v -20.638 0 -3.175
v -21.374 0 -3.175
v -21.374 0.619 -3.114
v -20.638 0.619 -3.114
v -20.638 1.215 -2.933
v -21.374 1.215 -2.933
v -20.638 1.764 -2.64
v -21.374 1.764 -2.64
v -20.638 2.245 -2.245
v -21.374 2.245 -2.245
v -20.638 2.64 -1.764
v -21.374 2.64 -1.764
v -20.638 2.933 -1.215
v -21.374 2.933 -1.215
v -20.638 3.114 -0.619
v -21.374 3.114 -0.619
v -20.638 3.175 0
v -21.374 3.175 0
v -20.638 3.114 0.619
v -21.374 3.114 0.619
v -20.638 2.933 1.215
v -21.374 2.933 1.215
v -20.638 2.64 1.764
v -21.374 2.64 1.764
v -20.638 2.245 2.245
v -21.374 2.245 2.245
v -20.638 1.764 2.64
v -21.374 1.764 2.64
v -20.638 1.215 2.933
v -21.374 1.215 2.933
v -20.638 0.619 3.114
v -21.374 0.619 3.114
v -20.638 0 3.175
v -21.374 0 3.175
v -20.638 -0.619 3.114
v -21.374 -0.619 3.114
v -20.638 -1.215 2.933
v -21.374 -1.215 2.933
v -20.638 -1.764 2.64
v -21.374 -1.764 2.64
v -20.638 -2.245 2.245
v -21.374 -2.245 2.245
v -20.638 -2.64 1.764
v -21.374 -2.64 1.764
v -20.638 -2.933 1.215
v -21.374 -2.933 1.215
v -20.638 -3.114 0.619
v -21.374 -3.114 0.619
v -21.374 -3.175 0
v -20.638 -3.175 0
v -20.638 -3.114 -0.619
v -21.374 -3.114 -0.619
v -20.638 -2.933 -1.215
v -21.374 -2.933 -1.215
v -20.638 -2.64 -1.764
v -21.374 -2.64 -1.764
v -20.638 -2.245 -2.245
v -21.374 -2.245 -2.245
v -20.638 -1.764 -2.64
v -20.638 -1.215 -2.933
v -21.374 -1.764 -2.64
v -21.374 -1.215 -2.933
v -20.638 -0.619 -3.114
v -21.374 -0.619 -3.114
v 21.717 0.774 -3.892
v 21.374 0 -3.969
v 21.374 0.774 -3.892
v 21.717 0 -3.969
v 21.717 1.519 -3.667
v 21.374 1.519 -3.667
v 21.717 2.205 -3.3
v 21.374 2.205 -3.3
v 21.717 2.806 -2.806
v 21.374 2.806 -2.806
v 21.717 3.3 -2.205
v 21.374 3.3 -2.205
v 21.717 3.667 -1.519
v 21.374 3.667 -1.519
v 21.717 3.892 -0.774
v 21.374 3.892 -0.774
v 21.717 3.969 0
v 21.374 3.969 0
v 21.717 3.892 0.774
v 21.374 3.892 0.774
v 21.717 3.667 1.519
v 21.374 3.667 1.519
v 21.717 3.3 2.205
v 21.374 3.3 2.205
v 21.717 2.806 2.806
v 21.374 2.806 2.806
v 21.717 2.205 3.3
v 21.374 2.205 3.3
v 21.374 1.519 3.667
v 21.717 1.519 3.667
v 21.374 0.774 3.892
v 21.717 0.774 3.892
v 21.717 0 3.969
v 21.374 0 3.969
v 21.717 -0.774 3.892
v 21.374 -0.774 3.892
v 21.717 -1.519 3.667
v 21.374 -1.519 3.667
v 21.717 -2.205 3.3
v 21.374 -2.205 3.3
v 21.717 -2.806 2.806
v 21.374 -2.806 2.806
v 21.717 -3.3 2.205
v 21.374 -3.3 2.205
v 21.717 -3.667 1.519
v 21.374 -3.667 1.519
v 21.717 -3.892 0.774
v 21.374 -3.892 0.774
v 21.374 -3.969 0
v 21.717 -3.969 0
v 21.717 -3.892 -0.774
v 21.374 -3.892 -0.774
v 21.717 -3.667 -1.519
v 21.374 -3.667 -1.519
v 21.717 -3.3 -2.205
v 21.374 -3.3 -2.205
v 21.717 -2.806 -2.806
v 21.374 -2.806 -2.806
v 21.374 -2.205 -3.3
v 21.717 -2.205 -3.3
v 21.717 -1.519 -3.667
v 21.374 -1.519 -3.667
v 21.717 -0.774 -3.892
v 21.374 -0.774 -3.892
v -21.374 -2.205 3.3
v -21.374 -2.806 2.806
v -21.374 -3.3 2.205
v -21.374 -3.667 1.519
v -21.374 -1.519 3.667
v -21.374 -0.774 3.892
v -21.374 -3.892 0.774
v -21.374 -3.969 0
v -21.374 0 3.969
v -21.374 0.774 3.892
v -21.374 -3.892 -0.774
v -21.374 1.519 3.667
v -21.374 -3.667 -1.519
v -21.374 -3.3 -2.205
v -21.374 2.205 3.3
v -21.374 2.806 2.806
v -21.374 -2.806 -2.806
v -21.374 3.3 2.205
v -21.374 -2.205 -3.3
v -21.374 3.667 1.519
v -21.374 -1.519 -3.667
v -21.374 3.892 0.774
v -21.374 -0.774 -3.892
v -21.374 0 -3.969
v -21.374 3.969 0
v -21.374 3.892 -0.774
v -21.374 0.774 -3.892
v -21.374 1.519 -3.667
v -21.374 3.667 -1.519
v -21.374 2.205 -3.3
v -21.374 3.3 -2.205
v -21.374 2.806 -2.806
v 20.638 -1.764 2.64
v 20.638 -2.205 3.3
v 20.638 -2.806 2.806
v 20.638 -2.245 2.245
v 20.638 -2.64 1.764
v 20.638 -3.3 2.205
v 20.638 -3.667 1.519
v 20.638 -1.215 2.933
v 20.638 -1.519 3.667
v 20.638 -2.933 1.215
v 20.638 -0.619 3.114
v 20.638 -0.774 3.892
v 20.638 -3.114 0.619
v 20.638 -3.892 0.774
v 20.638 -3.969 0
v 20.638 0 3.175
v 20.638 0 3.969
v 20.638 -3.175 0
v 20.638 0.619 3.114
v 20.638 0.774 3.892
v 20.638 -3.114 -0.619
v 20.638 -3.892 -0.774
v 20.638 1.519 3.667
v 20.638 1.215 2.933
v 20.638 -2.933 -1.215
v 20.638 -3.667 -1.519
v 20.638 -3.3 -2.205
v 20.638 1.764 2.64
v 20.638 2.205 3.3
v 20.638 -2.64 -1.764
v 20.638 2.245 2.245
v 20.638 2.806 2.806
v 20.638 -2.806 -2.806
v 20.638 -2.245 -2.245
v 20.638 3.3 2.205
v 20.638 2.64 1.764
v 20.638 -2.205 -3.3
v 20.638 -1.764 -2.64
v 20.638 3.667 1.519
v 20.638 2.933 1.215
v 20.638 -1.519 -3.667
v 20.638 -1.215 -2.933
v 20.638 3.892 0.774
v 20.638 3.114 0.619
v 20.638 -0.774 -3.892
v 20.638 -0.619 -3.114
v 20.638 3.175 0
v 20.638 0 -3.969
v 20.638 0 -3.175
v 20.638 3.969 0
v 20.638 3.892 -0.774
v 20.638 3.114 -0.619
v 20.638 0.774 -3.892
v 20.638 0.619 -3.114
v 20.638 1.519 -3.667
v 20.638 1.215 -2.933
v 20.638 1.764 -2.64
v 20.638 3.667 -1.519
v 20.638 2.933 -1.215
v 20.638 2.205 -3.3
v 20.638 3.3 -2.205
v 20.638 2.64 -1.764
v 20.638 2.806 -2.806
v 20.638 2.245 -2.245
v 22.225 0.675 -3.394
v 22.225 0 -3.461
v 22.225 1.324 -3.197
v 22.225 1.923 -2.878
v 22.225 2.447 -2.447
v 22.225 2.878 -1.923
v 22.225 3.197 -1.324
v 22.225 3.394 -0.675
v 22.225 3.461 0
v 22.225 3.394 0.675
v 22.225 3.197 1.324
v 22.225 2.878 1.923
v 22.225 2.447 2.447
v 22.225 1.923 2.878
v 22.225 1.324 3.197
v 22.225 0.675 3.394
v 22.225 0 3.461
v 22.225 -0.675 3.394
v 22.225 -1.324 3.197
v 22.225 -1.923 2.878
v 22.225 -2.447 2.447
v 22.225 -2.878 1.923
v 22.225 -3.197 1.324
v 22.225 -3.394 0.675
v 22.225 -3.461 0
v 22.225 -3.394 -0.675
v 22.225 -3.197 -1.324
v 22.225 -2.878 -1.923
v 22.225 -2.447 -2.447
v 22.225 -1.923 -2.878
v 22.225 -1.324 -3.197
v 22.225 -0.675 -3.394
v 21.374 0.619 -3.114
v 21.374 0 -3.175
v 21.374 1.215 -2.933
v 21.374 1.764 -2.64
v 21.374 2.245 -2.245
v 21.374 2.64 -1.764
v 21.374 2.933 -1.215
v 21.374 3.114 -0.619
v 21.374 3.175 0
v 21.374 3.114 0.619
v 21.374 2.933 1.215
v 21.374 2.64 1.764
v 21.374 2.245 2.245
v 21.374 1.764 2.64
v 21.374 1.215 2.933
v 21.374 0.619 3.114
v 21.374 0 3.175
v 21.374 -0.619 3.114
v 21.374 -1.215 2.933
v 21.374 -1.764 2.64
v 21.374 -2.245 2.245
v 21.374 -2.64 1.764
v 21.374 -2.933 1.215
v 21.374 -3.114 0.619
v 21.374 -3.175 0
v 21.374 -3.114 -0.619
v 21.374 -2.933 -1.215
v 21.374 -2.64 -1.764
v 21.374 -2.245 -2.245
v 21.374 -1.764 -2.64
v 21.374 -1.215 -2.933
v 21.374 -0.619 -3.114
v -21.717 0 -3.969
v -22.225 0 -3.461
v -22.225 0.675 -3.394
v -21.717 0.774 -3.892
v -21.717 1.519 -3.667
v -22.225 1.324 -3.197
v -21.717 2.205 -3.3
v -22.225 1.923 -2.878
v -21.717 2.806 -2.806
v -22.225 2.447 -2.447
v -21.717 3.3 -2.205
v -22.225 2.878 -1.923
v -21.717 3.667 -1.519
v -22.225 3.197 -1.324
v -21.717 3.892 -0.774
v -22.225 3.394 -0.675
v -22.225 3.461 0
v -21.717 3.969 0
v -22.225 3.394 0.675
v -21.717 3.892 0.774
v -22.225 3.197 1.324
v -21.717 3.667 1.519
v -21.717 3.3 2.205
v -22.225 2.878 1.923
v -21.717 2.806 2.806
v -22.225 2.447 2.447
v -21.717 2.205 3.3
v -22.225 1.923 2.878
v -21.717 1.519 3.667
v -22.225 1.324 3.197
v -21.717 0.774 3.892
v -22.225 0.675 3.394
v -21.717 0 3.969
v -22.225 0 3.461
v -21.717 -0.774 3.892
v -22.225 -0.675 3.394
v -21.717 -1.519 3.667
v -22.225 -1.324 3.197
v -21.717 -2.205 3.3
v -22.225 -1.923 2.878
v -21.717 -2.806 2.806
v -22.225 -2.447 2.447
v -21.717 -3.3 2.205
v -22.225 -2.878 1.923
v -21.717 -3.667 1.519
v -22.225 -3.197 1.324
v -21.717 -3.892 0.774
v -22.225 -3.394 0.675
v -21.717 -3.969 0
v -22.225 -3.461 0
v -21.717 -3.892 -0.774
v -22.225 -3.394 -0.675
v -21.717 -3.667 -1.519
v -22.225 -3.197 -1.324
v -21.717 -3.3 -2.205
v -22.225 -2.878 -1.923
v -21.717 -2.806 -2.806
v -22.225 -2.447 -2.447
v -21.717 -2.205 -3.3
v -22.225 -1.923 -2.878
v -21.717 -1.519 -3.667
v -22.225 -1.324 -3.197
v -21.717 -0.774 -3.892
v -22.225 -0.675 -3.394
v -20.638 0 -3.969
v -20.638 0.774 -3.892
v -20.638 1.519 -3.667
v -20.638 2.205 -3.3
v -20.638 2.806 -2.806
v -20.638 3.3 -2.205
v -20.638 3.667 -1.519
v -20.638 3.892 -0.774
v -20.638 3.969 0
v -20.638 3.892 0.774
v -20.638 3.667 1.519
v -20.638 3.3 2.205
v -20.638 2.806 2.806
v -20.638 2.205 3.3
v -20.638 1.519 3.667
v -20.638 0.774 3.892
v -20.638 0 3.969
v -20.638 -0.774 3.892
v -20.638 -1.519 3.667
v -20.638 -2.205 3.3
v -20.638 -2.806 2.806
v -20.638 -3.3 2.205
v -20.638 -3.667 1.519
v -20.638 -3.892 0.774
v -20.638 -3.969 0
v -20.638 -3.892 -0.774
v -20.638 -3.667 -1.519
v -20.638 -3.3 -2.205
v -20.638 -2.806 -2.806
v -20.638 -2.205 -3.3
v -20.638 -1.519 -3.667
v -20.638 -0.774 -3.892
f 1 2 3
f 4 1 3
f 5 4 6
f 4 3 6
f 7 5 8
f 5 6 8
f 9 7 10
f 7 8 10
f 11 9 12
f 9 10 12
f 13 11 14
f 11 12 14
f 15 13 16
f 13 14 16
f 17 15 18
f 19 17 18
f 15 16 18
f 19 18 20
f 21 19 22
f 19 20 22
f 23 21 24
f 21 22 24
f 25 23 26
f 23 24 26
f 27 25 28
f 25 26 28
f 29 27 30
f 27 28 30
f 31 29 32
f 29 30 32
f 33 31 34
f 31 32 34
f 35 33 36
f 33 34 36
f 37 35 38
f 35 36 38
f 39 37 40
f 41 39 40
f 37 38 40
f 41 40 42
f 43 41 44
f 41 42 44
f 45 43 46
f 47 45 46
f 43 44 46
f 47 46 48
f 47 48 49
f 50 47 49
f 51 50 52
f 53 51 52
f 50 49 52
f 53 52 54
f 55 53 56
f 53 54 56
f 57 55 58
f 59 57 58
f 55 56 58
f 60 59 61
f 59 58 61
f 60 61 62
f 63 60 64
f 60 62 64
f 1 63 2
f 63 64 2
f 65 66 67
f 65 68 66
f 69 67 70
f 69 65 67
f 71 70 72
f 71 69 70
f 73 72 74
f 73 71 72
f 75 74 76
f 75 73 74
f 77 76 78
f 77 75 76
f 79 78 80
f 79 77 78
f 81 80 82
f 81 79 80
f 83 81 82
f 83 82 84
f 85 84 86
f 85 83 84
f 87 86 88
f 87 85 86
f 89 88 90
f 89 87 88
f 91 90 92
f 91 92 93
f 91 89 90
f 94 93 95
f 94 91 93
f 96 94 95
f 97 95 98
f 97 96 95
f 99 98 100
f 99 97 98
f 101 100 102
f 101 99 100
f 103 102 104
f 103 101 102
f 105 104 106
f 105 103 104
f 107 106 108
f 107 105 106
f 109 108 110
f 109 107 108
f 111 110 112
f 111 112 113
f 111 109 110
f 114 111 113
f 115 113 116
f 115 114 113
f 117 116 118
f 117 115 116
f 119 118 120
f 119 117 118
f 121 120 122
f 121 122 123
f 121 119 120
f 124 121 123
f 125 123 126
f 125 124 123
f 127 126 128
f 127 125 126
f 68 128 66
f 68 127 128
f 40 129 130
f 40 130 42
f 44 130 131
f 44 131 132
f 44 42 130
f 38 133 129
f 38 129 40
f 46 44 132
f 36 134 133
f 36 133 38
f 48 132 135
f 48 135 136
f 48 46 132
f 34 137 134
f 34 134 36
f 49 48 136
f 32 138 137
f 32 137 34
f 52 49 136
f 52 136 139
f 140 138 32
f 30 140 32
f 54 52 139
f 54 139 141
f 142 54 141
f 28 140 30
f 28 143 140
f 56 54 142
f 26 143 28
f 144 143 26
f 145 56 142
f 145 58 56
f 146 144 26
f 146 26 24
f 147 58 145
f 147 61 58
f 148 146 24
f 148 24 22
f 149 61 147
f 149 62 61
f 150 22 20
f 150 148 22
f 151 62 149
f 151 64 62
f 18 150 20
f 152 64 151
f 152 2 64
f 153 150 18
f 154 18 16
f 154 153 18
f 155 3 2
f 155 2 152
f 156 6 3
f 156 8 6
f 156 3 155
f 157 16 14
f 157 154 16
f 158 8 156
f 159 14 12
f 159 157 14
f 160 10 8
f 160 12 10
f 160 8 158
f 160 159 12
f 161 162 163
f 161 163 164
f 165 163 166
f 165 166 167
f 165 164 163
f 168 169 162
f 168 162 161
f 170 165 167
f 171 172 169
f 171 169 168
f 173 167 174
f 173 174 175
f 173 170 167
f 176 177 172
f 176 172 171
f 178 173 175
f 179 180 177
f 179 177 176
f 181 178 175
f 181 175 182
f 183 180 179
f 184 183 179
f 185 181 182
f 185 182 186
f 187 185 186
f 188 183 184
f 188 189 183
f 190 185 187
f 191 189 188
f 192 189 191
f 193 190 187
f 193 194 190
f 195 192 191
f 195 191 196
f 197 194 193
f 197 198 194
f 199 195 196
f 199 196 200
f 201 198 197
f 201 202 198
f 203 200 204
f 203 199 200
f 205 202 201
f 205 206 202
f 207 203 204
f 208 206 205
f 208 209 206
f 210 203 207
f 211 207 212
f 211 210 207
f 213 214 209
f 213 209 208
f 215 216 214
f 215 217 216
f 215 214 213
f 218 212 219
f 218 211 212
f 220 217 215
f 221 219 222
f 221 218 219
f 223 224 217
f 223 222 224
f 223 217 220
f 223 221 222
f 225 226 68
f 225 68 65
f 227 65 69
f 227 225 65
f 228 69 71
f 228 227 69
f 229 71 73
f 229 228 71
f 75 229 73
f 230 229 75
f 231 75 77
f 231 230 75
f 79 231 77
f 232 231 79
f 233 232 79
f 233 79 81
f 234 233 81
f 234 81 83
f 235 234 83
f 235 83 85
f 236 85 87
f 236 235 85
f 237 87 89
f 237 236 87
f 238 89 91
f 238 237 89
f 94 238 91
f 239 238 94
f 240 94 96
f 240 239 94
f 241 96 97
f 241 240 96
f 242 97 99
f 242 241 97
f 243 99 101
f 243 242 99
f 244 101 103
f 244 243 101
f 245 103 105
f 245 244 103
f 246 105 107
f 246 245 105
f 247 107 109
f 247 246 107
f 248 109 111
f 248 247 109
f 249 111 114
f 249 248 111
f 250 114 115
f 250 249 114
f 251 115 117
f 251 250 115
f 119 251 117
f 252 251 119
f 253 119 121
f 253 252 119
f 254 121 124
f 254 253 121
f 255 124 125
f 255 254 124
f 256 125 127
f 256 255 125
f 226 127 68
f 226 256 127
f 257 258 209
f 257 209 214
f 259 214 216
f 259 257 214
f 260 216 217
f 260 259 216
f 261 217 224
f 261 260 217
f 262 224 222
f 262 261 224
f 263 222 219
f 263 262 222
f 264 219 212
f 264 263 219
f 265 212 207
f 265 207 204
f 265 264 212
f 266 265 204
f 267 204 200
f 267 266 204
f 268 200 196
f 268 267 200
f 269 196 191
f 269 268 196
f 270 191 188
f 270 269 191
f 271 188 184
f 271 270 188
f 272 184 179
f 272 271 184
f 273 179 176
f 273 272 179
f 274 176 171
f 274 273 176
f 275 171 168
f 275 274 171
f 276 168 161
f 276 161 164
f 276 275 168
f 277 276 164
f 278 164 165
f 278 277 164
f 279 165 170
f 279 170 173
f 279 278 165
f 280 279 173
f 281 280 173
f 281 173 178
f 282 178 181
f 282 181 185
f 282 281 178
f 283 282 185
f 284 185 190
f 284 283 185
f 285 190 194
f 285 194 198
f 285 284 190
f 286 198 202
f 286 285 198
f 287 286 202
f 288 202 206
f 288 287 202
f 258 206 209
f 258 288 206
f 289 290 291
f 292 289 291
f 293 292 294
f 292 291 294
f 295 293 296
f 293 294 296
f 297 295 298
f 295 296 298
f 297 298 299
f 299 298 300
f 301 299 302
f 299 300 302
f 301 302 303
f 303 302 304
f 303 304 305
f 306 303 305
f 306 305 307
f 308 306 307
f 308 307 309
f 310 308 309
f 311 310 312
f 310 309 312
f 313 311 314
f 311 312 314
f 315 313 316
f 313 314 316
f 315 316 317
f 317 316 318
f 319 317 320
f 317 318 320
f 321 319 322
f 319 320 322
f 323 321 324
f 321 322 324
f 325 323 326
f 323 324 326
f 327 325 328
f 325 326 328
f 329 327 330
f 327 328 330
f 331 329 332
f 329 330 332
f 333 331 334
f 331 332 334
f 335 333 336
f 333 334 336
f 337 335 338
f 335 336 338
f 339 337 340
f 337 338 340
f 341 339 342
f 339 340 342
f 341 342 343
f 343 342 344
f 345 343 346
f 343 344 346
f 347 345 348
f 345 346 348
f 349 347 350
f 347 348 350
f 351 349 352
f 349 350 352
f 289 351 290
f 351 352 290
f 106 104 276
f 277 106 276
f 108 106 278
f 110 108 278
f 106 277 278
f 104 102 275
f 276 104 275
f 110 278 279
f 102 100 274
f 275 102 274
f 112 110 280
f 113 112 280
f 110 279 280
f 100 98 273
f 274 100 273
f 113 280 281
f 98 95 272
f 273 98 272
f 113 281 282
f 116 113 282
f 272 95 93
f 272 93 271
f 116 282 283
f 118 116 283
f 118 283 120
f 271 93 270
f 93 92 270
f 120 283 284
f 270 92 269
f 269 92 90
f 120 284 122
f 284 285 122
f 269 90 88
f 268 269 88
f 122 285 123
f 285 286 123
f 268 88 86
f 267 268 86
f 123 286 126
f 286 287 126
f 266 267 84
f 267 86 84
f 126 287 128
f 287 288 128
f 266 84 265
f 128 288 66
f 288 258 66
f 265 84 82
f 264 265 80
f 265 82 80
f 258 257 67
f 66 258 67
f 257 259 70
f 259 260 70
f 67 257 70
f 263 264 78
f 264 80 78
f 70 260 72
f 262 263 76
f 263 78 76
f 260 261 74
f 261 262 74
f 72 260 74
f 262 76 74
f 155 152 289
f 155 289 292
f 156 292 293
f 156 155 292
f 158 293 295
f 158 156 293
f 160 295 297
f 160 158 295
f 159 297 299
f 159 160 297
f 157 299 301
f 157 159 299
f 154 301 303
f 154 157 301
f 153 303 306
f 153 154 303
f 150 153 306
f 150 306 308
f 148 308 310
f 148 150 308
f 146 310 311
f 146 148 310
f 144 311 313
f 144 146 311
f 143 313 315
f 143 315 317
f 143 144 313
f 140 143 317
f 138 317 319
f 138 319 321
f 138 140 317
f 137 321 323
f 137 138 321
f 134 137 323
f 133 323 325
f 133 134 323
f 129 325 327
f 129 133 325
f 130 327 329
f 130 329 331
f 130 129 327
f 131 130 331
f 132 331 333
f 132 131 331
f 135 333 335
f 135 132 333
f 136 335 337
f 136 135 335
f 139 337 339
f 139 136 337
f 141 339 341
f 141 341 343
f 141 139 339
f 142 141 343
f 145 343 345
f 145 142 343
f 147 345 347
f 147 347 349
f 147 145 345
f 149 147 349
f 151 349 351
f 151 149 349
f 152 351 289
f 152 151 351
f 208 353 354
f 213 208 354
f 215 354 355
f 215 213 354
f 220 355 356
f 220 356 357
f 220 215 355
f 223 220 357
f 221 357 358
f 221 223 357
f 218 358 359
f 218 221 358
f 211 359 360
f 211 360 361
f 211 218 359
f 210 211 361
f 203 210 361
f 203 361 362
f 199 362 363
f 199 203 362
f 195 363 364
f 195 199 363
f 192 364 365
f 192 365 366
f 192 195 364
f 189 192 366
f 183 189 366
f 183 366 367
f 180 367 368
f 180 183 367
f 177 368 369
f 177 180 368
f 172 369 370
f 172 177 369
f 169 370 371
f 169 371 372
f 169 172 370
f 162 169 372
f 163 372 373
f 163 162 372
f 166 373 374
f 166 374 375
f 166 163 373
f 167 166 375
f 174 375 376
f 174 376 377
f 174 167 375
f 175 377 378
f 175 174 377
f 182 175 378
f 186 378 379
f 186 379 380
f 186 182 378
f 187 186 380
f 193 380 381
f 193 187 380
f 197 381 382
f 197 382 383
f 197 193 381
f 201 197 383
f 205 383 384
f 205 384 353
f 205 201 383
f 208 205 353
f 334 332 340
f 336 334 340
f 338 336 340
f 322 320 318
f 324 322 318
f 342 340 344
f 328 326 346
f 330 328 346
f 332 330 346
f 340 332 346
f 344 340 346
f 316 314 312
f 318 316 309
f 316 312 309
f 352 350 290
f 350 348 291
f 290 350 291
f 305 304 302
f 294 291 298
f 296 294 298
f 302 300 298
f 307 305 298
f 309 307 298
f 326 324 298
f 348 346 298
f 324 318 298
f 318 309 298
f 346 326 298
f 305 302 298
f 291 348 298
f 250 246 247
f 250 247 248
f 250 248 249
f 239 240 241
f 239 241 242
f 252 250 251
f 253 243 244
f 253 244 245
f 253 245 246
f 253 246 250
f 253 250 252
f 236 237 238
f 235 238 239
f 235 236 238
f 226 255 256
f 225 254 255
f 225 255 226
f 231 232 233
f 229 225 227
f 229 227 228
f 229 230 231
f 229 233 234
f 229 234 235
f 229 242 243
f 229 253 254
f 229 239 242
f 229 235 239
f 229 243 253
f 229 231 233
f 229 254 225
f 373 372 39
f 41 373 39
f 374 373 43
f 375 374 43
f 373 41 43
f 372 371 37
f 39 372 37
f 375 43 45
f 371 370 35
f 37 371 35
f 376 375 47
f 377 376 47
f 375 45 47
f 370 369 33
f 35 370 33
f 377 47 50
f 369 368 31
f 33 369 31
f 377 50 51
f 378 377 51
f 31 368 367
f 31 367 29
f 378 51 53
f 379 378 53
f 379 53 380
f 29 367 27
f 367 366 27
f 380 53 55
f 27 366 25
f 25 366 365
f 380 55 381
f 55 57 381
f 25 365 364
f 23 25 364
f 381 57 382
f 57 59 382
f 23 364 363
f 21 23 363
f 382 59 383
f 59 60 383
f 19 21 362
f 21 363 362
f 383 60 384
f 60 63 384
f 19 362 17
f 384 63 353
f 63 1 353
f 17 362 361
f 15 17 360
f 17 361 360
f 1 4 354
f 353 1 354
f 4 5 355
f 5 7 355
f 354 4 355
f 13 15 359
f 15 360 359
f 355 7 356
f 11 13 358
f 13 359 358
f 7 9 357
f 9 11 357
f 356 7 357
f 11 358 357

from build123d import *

# Parameters (mm, degrees)
SKETCH1_R           = 3.96875
BOSS_EXTRUDE1_DEPTH = 22.225
CHAMFER1_SIZE       = 0.508
CUT_EXTRUDE1_START  = 0.7366
SKETCH2_R           = 3.96875
SKETCH2_R_2         = 3.175
CUT_EXTRUDE1_DEPTH  = 0.7366


with BuildPart() as part:
    # Sketch1 → Boss-Extrude1 (new, symmetric)
    with BuildSketch(Plane(origin=(0, 0, 0), x_dir=(0, 0, -1), z_dir=(1, 0, 0))):
        Circle(SKETCH1_R)
    extrude(amount=BOSS_EXTRUDE1_DEPTH, both=True)

    # Chamfer1
    chamfer1_edges = [part.edges().sort_by_distance(p)[0] for p in [
        (-22.225, 0, 3.96875),
        (22.225, 0, 3.96875),
    ]]
    chamfer(chamfer1_edges, length=CHAMFER1_SIZE)

    # Sketch2 → Cut-Extrude1 (cut)
    with BuildSketch(Plane(origin=(20.6375, 0, 0), x_dir=(0, 0, -1), z_dir=(1, 0, 0)).offset(CUT_EXTRUDE1_START)):
        Circle(SKETCH2_R)
        Circle(SKETCH2_R_2, mode=Mode.SUBTRACT)
    cut_extrude1 = extrude(amount=-CUT_EXTRUDE1_DEPTH, mode=Mode.SUBTRACT)

    # Mirror1: Cut-Extrude1 across plane
    add(cut_extrude1.mirror(Plane(origin=(0, 0, 0), x_dir=(0, 0, 1), z_dir=(1, 0, 0))), mode=Mode.SUBTRACT)


solid = part.part
